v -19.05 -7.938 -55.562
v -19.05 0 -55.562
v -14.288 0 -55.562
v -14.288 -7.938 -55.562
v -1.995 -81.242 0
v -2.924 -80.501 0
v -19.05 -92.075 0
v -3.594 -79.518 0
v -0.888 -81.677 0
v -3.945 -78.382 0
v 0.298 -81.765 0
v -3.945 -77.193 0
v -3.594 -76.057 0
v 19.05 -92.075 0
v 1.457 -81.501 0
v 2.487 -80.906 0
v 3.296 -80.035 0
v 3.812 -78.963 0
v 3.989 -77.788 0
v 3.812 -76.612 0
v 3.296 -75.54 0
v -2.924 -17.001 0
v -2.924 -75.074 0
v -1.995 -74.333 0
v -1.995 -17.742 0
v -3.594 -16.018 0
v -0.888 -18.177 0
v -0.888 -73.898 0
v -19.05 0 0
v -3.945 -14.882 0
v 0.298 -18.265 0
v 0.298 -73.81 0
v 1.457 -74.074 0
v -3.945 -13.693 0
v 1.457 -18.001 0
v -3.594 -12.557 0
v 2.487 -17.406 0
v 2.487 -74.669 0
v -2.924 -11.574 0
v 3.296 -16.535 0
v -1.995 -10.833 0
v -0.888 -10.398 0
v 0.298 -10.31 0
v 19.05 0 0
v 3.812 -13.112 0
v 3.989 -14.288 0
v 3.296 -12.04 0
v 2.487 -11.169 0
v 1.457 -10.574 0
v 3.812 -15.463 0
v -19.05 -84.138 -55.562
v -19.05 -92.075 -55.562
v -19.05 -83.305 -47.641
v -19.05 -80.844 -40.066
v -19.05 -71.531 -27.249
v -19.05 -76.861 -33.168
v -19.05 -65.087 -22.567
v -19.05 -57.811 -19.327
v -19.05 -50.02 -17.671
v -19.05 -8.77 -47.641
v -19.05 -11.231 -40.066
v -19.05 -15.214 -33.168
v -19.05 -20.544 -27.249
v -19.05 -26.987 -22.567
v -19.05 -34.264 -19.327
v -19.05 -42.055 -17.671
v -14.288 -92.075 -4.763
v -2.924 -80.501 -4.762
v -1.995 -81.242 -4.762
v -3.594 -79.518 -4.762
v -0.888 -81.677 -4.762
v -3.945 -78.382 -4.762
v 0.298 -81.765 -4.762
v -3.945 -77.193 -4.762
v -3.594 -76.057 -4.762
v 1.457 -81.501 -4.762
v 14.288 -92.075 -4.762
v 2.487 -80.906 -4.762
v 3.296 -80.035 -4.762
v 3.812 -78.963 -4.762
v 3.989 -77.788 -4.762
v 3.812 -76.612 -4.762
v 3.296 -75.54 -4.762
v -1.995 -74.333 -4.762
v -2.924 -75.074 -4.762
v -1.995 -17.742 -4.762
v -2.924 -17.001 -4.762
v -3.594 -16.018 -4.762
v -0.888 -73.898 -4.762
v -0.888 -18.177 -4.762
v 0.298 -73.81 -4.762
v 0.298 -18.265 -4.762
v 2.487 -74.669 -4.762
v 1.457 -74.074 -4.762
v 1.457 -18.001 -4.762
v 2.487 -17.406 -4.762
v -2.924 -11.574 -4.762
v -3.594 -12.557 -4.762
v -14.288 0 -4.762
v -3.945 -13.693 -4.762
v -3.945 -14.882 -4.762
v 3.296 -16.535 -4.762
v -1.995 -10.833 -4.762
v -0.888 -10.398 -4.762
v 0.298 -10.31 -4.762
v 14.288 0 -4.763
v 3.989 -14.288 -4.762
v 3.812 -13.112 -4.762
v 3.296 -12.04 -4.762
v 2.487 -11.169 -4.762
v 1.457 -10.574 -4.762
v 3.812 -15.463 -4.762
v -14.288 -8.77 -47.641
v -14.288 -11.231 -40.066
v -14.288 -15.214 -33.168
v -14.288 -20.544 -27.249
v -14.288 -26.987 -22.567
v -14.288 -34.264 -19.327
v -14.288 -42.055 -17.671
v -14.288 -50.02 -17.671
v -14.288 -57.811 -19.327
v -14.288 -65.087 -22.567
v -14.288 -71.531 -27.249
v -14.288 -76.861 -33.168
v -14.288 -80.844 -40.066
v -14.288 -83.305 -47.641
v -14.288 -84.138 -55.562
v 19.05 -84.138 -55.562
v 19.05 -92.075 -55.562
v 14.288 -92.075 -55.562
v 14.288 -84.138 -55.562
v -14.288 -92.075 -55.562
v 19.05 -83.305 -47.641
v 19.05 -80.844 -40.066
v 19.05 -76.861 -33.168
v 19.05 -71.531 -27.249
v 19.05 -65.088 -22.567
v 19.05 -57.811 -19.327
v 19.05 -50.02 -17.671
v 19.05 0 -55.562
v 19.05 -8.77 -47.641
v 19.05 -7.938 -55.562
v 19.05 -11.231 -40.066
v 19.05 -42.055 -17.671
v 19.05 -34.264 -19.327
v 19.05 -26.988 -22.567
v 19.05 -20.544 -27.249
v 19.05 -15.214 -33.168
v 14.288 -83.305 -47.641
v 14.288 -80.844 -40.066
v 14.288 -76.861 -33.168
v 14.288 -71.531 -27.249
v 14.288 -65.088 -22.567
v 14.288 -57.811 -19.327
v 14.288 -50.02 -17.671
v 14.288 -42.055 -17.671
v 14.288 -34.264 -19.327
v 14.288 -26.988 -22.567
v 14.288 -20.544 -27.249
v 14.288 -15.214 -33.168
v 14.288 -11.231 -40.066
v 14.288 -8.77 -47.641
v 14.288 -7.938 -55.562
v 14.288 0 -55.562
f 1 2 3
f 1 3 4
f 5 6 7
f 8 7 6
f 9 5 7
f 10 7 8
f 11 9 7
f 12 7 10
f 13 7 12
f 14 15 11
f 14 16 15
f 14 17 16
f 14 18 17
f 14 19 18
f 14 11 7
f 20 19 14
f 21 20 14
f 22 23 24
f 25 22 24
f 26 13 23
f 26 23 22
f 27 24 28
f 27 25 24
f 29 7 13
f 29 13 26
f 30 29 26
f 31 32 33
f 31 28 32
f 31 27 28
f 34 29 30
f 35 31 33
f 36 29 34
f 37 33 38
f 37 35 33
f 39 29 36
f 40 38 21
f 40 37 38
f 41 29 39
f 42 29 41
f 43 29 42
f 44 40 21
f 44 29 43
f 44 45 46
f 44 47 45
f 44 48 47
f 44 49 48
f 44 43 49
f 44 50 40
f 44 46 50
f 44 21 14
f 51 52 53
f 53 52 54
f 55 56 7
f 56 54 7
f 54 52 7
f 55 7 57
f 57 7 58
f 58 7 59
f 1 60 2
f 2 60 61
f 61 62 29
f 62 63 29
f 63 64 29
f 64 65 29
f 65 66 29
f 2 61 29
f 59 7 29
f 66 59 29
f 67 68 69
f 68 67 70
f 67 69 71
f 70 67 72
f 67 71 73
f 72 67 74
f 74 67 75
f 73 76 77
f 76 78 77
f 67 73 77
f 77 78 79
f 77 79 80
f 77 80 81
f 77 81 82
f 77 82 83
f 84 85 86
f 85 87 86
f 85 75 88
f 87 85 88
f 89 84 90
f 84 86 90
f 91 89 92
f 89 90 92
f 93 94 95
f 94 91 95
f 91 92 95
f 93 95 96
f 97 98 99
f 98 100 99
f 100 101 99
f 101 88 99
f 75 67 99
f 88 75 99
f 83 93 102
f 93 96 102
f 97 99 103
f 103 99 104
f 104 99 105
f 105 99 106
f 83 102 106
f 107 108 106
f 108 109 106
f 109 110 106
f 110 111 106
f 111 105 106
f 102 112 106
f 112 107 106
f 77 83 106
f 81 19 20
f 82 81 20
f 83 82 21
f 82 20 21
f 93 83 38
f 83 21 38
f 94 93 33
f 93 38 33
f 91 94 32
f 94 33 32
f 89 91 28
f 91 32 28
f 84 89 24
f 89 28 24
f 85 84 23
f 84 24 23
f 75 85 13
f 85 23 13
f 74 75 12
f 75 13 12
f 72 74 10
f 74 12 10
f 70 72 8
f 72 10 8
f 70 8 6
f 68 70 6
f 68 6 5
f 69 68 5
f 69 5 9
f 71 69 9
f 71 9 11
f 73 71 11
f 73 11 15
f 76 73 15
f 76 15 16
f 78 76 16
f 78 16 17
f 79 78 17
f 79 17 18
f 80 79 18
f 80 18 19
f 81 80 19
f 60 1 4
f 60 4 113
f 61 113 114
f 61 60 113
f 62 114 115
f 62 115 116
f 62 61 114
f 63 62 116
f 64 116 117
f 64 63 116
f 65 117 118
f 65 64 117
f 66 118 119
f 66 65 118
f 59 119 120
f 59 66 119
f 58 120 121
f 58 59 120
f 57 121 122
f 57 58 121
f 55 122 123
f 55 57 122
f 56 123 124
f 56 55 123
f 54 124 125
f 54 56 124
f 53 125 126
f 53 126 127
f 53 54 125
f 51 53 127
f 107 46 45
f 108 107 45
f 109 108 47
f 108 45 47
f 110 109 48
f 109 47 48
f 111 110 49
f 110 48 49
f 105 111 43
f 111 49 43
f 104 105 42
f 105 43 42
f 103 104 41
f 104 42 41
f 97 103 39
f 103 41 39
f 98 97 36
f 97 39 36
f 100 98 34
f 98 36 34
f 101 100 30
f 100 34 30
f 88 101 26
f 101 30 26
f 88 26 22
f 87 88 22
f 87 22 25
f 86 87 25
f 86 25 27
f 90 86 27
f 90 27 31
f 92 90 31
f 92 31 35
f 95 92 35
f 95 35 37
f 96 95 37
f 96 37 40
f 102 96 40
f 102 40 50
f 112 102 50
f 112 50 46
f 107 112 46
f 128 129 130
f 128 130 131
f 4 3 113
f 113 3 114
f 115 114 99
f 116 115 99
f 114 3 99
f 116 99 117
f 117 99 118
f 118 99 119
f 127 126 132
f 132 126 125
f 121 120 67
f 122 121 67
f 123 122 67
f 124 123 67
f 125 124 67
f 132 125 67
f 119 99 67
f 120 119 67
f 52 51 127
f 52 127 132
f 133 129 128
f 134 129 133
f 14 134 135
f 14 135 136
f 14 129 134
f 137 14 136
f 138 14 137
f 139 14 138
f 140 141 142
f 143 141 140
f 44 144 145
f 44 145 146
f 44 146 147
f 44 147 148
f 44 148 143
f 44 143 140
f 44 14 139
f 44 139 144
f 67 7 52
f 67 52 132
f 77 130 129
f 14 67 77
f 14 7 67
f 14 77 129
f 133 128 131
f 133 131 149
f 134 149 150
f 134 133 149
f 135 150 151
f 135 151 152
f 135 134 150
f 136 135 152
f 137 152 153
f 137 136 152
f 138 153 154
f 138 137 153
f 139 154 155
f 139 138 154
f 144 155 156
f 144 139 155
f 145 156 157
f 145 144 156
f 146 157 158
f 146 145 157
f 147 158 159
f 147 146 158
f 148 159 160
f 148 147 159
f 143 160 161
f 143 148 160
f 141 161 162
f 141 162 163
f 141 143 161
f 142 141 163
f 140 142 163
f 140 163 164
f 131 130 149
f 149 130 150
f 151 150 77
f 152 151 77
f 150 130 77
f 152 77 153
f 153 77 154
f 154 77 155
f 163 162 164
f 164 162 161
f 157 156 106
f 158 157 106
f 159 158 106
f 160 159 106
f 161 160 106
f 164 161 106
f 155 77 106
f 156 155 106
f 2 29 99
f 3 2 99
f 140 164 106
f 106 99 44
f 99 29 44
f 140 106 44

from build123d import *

# Parameters (mm, degrees)
F0_W     = 38.1
F0_H     = 92.075
F1_DEPTH = 4.7625
F3_DEPTH = 4.7625
F5_DEPTH = 4.7625
F6_R     = 3.98907
F7_DEPTH = 55.5635


with BuildPart() as f1:
    # F0 (on Top) → F1 (new body)
    with BuildSketch(Plane.XY):
        with Locations((0, -46.0375)):
            Rectangle(F0_W, F0_H)
    extrude(amount=-F1_DEPTH)

    # F2 (on face) → F3 (join)
    with BuildSketch(Plane(origin=(-19.05, 0, 0), x_dir=(0, -1, 0), z_dir=(-1, 0, 0))):
        with BuildLine():
            Line((92.075, 0), (0, 0))
            Line((0, 0), (0, -55.5625))
            Line((0, -55.5625), (7.9375, -55.5625))
            ThreePointArc((7.9375, -55.5625), (46.0375, -17.4625), (84.1375, -55.5625))
            Line((84.1375, -55.5625), (92.075, -55.5625))
            Line((92.075, -55.5625), (92.075, 0))
        make_face()
    extrude(amount=-F3_DEPTH)

    # F4 (on face) → F5 (join)
    with BuildSketch(Plane.YZ.offset(19.05)):
        with BuildLine():
            Line((0, 0), (-92.075, 0))
            Line((-92.075, 0), (-92.075, -55.5625))
            Line((-92.075, -55.5625), (-84.1375, -55.5625))
            ThreePointArc((-84.1375, -55.5625), (-46.0375, -17.4625), (-7.9375, -55.5625))
            Line((-7.9375, -55.5625), (0, -55.5625))
            Line((0, -55.5625), (0, 0))
        make_face()
    extrude(amount=-F5_DEPTH)

    # F6 (on Top) → F7 (cut, through all)
    with BuildSketch(Plane.XY):
        with Locations((0, -14.2875)):
            Circle(F6_R)
        with Locations((0, -77.7875)):
            Circle(F6_R)
    extrude(amount=-F7_DEPTH, mode=Mode.SUBTRACT)


solid = f1.part
